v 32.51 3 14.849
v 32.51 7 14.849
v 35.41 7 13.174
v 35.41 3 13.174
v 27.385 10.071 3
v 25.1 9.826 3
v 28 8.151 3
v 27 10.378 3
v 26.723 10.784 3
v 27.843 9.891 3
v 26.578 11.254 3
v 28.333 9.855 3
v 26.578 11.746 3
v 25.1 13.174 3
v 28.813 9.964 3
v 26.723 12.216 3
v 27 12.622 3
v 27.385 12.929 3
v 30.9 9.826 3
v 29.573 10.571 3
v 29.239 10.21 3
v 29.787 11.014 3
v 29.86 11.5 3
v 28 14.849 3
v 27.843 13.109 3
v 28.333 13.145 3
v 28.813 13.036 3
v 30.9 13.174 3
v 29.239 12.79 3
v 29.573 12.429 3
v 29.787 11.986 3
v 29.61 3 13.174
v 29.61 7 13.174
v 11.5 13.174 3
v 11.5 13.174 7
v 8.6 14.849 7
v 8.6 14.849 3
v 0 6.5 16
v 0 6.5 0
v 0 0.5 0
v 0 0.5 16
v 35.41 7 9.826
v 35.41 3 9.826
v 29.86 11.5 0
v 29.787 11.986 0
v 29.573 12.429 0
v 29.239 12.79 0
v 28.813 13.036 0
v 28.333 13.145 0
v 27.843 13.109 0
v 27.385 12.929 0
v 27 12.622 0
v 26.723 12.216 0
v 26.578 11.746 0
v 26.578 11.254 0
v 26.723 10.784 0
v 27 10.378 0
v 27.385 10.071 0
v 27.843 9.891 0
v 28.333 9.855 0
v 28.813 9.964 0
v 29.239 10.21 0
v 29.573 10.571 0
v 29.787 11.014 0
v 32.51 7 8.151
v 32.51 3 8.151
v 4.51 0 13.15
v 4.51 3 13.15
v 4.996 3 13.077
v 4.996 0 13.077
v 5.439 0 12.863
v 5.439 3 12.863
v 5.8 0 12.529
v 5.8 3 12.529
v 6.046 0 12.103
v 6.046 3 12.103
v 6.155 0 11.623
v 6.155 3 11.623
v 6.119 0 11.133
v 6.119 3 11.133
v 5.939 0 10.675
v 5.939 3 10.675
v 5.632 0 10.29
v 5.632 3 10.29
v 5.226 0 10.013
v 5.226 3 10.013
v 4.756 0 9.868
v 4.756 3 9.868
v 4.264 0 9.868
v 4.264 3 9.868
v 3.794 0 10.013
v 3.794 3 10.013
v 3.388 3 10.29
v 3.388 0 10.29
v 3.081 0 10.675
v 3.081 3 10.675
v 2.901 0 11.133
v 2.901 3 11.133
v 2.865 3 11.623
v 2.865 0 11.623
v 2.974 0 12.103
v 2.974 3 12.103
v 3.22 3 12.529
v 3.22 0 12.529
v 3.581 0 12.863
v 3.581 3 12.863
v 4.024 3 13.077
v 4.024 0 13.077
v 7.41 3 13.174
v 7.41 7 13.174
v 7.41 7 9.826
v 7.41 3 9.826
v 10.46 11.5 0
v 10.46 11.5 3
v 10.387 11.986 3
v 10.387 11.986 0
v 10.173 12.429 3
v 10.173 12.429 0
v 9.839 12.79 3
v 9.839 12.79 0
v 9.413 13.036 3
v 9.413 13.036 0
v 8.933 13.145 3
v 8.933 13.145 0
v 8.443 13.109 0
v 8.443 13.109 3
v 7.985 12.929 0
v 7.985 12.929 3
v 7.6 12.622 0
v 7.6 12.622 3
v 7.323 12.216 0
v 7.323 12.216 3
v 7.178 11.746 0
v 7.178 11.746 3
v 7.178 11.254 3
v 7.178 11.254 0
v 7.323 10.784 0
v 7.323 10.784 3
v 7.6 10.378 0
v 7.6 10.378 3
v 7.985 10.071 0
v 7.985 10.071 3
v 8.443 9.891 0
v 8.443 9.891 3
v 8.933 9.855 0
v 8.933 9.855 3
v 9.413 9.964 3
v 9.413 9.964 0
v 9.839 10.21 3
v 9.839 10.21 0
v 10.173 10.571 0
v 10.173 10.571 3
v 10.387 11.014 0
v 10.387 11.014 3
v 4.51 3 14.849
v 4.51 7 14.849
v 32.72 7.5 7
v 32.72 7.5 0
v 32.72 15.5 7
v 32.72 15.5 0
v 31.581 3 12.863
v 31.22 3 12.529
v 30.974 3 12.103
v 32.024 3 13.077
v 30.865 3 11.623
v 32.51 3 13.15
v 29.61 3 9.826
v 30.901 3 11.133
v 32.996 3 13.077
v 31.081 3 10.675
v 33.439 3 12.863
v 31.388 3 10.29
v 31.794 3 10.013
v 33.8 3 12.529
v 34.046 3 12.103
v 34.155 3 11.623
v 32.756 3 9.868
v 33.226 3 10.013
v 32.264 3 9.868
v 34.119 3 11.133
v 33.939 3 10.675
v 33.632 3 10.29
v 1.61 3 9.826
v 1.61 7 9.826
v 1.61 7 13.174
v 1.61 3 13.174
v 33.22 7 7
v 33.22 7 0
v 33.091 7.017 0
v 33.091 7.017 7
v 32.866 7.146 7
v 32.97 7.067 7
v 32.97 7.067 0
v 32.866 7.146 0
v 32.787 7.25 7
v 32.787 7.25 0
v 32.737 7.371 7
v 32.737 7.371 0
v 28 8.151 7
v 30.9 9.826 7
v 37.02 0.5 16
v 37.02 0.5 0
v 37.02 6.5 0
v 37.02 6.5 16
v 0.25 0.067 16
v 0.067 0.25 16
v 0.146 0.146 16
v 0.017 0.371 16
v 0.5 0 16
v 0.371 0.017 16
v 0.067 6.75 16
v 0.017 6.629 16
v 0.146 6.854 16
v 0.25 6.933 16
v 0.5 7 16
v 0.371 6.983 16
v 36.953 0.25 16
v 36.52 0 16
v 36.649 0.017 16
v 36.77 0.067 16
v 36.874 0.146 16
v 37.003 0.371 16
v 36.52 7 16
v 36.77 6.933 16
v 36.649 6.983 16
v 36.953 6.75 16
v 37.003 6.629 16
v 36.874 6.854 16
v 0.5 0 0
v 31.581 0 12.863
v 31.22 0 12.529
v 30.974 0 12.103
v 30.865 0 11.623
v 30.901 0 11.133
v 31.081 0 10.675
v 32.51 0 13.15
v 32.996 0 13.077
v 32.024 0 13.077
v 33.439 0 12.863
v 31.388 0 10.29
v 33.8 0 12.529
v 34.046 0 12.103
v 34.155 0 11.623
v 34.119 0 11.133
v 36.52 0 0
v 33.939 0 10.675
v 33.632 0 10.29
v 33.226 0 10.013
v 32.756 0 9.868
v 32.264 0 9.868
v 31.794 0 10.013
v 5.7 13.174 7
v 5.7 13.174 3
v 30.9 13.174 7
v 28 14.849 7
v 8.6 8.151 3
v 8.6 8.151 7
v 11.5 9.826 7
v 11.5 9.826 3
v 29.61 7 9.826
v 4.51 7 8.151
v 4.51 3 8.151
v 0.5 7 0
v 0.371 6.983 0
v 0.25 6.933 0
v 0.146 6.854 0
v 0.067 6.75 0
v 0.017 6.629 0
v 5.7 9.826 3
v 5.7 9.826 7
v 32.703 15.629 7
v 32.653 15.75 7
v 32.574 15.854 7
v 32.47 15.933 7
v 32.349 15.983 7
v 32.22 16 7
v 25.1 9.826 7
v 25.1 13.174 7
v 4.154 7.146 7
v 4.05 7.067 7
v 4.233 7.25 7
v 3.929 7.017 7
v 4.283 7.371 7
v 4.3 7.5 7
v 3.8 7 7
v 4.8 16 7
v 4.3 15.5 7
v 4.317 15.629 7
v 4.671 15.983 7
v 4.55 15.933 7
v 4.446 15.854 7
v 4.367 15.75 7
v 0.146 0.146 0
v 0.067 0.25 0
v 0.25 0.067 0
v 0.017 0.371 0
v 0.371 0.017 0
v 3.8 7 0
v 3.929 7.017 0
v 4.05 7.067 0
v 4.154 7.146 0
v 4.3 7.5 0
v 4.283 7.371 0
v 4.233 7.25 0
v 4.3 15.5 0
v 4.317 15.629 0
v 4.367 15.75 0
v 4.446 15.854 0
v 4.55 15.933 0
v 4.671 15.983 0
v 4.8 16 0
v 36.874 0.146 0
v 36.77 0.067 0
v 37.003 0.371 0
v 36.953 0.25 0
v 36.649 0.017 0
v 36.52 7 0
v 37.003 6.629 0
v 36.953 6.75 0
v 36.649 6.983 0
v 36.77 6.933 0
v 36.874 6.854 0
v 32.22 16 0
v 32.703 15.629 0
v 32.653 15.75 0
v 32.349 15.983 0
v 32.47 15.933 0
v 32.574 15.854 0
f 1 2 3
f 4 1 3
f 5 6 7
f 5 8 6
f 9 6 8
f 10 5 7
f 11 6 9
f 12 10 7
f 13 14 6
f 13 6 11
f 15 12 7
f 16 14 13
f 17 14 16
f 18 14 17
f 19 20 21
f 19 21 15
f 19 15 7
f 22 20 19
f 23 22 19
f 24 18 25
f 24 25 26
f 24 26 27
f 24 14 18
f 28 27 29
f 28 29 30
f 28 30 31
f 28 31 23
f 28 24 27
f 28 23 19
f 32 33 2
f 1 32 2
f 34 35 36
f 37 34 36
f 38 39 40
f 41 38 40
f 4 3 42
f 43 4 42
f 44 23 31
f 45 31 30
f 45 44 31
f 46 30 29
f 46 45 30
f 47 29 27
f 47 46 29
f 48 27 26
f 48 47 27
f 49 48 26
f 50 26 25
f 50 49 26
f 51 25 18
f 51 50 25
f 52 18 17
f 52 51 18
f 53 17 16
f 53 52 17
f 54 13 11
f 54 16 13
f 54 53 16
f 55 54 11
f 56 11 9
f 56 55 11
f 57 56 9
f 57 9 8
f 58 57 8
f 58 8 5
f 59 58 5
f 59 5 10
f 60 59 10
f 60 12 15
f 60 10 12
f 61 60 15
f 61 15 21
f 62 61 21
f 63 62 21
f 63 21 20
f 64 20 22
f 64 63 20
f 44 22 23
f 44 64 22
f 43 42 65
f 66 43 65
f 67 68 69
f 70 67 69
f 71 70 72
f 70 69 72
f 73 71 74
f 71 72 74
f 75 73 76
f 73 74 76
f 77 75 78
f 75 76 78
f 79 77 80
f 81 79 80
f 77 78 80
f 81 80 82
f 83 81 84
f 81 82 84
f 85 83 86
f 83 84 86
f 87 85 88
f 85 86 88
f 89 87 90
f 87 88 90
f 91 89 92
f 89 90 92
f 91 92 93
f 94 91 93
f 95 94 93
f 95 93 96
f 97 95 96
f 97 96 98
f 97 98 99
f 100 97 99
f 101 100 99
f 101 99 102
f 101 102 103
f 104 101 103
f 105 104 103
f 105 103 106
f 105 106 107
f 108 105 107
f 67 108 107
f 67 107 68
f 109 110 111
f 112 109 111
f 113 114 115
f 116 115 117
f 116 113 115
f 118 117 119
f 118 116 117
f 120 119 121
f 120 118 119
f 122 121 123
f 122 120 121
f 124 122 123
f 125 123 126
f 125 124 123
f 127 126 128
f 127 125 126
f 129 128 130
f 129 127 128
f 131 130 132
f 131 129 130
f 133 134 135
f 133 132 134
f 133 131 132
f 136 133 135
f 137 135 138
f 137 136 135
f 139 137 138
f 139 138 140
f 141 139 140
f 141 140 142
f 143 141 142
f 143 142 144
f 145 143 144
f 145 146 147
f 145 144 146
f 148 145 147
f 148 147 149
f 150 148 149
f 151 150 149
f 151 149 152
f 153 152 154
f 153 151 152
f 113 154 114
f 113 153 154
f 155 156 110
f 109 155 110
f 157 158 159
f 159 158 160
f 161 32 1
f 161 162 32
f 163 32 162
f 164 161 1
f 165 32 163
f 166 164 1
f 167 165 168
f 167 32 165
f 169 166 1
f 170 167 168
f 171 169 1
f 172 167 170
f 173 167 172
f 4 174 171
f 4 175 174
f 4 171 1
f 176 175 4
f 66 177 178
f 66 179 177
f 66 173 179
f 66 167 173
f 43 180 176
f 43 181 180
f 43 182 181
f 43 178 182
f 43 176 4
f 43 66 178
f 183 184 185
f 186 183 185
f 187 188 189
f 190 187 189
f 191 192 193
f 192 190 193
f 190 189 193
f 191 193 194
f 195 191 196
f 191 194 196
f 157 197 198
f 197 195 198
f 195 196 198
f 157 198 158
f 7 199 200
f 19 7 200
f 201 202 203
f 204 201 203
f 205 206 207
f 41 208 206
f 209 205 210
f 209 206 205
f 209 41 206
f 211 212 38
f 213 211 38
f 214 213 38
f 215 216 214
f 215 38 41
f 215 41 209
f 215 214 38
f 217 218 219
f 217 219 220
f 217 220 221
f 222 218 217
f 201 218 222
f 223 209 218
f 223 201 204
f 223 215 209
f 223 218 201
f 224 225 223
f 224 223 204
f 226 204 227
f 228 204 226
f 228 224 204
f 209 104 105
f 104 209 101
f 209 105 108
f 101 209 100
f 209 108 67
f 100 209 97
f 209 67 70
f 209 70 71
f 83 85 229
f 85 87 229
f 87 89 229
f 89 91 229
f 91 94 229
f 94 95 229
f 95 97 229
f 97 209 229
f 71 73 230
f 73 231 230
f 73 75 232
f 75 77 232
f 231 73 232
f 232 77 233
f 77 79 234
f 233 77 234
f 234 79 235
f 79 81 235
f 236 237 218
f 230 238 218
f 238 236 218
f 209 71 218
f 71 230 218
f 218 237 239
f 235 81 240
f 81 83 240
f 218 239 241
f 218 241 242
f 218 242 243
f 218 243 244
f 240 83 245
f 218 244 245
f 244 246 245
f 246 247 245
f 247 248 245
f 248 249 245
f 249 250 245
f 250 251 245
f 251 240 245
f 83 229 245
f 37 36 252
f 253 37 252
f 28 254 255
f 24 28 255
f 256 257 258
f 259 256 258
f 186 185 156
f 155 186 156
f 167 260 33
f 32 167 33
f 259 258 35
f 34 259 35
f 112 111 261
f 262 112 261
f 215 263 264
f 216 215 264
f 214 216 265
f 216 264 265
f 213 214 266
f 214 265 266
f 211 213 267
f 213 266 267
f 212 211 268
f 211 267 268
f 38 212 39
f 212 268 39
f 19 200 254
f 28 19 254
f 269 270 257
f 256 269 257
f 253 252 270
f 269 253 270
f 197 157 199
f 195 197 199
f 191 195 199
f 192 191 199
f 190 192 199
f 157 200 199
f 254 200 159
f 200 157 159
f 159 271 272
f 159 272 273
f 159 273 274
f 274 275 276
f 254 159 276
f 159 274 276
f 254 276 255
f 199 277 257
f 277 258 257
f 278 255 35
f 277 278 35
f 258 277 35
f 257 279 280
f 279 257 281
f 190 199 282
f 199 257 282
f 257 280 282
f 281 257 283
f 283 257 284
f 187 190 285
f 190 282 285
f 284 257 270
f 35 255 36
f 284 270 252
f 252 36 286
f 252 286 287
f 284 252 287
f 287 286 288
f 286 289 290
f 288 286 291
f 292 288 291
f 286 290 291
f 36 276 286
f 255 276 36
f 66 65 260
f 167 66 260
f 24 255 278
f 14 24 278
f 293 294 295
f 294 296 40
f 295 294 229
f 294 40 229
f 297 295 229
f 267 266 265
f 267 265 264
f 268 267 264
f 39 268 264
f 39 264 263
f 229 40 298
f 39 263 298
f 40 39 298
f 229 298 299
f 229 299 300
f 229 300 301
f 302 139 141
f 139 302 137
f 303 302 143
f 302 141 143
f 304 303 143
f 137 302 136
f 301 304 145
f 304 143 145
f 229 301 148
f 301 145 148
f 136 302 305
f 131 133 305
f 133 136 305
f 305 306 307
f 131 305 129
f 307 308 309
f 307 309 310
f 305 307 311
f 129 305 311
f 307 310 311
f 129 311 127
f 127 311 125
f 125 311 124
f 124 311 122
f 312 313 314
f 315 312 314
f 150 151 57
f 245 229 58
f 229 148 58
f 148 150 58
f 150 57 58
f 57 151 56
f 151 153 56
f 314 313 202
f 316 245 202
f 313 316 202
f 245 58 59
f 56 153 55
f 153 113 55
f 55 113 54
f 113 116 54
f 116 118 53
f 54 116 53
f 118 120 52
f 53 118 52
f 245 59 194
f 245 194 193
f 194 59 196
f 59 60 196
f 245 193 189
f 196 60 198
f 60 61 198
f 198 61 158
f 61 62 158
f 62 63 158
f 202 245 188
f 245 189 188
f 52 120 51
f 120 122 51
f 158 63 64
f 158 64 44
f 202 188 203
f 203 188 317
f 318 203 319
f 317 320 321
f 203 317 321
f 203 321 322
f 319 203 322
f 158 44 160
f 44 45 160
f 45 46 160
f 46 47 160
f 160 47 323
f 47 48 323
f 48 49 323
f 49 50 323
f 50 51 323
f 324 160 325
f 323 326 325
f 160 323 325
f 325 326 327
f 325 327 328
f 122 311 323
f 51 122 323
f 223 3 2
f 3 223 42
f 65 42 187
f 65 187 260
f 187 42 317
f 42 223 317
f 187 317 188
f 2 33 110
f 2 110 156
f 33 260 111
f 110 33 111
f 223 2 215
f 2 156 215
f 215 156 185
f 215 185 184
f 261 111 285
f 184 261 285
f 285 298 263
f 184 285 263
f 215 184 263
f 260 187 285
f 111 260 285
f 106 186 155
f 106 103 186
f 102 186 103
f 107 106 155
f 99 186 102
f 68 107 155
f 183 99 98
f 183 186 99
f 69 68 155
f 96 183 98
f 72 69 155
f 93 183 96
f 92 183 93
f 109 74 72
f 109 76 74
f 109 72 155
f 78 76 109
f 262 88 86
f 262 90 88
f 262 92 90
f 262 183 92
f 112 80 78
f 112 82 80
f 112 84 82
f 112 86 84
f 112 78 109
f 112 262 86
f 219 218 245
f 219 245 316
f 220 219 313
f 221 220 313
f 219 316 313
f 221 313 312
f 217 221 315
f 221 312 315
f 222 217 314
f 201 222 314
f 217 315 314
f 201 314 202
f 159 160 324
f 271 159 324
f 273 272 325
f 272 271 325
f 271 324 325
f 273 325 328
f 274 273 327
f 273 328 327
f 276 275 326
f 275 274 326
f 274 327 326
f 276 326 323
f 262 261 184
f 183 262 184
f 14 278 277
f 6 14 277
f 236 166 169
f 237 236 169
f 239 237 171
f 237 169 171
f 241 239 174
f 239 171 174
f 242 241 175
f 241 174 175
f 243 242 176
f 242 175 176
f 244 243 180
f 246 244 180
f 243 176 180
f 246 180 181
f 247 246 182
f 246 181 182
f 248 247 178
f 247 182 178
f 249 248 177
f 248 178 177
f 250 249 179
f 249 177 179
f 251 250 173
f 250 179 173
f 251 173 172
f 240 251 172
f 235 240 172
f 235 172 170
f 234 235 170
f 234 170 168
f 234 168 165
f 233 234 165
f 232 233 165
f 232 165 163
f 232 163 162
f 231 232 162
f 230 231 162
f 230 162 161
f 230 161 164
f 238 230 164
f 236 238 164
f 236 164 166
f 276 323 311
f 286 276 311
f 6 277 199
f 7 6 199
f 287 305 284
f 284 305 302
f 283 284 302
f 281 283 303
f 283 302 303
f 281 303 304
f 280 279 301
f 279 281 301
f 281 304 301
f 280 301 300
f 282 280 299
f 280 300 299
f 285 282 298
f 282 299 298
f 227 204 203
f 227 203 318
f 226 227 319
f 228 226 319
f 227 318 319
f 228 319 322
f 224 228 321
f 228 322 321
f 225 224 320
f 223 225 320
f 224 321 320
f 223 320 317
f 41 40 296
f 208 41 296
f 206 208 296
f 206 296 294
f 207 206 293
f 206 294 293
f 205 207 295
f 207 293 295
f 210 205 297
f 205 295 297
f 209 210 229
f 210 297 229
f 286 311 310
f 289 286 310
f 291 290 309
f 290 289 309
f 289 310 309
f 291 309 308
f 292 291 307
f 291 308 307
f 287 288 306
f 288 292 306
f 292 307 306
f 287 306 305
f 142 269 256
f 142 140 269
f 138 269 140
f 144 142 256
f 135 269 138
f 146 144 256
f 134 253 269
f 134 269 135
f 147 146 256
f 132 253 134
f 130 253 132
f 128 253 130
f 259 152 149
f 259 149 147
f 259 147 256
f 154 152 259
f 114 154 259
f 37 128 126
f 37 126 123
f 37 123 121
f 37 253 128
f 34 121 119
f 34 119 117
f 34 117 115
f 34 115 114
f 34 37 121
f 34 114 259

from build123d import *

# Parameters (mm, degrees)
SKETCH1_R           = 1.65
BOSS_EXTRUDE1_DEPTH = 16
CUT_EXTRUDE1_START  = -9
CUT_EXTRUDE1_DEPTH  = 9
CUT_EXTRUDE2_DEPTH  = 4
SKETCH4_R           = 1.65
CUT_EXTRUDE3_DEPTH  = 7
CUT_EXTRUDE4_DEPTH  = 4


with BuildPart() as part:
    # Sketch1 → Boss-Extrude1 (new body)
    with BuildSketch(Plane.XY):
        with BuildLine():
            Line((36.52, 7), (33.22, 7))
            ThreePointArc((33.22, 7), (32.866446609, 7.146446609), (32.72, 7.5))
            Line((32.72, 7.5), (32.72, 15.5))
            ThreePointArc((32.72, 15.5), (32.573553391, 15.853553391), (32.22, 16))
            Line((32.22, 16), (4.8, 16))
            ThreePointArc((4.8, 16), (4.446446609, 15.853553391), (4.3, 15.5))
            Line((4.3, 15.5), (4.3, 7.5))
            ThreePointArc((4.3, 7.5), (4.153553391, 7.146446609), (3.8, 7))
            Line((3.8, 7), (0.5, 7))
            ThreePointArc((0.5, 7), (0.146446609, 6.853553391), (0, 6.5))
            Line((0, 6.5), (0, 0.5))
            ThreePointArc((0, 0.5), (0.146446609, 0.146446609), (0.5, 0))
            Line((0.5, 0), (36.52, 0))
            ThreePointArc((36.52, 0), (36.873553391, 0.146446609), (37.02, 0.5))
            Line((37.02, 0.5), (37.02, 6.5))
            ThreePointArc((37.02, 6.5), (36.873553391, 6.853553391), (36.52, 7))
        make_face()
        with Locations((8.81, 11.5)):
            Circle(SKETCH1_R, mode=Mode.SUBTRACT)
        with Locations((28.21, 11.5)):
            Circle(SKETCH1_R, mode=Mode.SUBTRACT)
    extrude(amount=BOSS_EXTRUDE1_DEPTH)

    # Sketch2 → Cut-Extrude1 (cut)
    with BuildSketch(Plane.XY.offset(16).offset(CUT_EXTRUDE1_START)):
        with BuildLine():
            Line((33.22, 7), (3.8, 7))
            ThreePointArc((3.8, 7), (4.153553391, 7.146446609), (4.3, 7.5))
            Line((4.3, 7.5), (4.3, 16))
            Line((4.3, 16), (32.72, 16))
            Line((32.72, 16), (32.72, 7.5))
            ThreePointArc((32.72, 7.5), (32.866446609, 7.146446609), (33.22, 7))
        make_face()
    extrude(amount=CUT_EXTRUDE1_DEPTH, mode=Mode.SUBTRACT)

    # Sketch3 → Cut-Extrude2 (cut)
    with BuildSketch(Plane.XY.offset(7)):
        Polygon((8.6, 8.151368439), (11.5, 9.825684219), (11.5, 13.174315781), (8.6, 14.848631561), (5.7, 13.174315781), (5.7, 9.825684219), align=None)
        Polygon((28, 8.151368439), (30.9, 9.825684219), (30.9, 13.174315781), (28, 14.848631561), (25.1, 13.174315781), (25.1, 9.825684219), align=None)
    extrude(amount=-CUT_EXTRUDE2_DEPTH, mode=Mode.SUBTRACT)

    # Sketch4 → Cut-Extrude3 (cut)
    with BuildSketch(Plane(origin=(0, 7, 0), x_dir=(1, 0, 0), z_dir=(0, 1, 0))):
        with Locations(Location((32.51, -11.5, 0), (0, 0, 270))):
            Circle(SKETCH4_R)
        with Locations(Location((4.51, -11.5, 0), (0, 0, 270))):
            Circle(SKETCH4_R)
    extrude(amount=-CUT_EXTRUDE3_DEPTH, mode=Mode.SUBTRACT)

    # Sketch5 → Cut-Extrude4 (cut)
    with BuildSketch(Plane(origin=(0, 7, 0), x_dir=(1, 0, 0), z_dir=(0, 1, 0))):
        Polygon((32.51, -14.848631561), (35.41, -13.174315781), (35.41, -9.825684219), (32.51, -8.151368439), (29.61, -9.825684219), (29.61, -13.174315781), align=None)
        Polygon((4.51, -14.848631561), (7.41, -13.174315781), (7.41, -9.825684219), (4.51, -8.151368439), (1.61, -9.825684219), (1.61, -13.174315781), align=None)
    extrude(amount=-CUT_EXTRUDE4_DEPTH, mode=Mode.SUBTRACT)


solid = part.part
